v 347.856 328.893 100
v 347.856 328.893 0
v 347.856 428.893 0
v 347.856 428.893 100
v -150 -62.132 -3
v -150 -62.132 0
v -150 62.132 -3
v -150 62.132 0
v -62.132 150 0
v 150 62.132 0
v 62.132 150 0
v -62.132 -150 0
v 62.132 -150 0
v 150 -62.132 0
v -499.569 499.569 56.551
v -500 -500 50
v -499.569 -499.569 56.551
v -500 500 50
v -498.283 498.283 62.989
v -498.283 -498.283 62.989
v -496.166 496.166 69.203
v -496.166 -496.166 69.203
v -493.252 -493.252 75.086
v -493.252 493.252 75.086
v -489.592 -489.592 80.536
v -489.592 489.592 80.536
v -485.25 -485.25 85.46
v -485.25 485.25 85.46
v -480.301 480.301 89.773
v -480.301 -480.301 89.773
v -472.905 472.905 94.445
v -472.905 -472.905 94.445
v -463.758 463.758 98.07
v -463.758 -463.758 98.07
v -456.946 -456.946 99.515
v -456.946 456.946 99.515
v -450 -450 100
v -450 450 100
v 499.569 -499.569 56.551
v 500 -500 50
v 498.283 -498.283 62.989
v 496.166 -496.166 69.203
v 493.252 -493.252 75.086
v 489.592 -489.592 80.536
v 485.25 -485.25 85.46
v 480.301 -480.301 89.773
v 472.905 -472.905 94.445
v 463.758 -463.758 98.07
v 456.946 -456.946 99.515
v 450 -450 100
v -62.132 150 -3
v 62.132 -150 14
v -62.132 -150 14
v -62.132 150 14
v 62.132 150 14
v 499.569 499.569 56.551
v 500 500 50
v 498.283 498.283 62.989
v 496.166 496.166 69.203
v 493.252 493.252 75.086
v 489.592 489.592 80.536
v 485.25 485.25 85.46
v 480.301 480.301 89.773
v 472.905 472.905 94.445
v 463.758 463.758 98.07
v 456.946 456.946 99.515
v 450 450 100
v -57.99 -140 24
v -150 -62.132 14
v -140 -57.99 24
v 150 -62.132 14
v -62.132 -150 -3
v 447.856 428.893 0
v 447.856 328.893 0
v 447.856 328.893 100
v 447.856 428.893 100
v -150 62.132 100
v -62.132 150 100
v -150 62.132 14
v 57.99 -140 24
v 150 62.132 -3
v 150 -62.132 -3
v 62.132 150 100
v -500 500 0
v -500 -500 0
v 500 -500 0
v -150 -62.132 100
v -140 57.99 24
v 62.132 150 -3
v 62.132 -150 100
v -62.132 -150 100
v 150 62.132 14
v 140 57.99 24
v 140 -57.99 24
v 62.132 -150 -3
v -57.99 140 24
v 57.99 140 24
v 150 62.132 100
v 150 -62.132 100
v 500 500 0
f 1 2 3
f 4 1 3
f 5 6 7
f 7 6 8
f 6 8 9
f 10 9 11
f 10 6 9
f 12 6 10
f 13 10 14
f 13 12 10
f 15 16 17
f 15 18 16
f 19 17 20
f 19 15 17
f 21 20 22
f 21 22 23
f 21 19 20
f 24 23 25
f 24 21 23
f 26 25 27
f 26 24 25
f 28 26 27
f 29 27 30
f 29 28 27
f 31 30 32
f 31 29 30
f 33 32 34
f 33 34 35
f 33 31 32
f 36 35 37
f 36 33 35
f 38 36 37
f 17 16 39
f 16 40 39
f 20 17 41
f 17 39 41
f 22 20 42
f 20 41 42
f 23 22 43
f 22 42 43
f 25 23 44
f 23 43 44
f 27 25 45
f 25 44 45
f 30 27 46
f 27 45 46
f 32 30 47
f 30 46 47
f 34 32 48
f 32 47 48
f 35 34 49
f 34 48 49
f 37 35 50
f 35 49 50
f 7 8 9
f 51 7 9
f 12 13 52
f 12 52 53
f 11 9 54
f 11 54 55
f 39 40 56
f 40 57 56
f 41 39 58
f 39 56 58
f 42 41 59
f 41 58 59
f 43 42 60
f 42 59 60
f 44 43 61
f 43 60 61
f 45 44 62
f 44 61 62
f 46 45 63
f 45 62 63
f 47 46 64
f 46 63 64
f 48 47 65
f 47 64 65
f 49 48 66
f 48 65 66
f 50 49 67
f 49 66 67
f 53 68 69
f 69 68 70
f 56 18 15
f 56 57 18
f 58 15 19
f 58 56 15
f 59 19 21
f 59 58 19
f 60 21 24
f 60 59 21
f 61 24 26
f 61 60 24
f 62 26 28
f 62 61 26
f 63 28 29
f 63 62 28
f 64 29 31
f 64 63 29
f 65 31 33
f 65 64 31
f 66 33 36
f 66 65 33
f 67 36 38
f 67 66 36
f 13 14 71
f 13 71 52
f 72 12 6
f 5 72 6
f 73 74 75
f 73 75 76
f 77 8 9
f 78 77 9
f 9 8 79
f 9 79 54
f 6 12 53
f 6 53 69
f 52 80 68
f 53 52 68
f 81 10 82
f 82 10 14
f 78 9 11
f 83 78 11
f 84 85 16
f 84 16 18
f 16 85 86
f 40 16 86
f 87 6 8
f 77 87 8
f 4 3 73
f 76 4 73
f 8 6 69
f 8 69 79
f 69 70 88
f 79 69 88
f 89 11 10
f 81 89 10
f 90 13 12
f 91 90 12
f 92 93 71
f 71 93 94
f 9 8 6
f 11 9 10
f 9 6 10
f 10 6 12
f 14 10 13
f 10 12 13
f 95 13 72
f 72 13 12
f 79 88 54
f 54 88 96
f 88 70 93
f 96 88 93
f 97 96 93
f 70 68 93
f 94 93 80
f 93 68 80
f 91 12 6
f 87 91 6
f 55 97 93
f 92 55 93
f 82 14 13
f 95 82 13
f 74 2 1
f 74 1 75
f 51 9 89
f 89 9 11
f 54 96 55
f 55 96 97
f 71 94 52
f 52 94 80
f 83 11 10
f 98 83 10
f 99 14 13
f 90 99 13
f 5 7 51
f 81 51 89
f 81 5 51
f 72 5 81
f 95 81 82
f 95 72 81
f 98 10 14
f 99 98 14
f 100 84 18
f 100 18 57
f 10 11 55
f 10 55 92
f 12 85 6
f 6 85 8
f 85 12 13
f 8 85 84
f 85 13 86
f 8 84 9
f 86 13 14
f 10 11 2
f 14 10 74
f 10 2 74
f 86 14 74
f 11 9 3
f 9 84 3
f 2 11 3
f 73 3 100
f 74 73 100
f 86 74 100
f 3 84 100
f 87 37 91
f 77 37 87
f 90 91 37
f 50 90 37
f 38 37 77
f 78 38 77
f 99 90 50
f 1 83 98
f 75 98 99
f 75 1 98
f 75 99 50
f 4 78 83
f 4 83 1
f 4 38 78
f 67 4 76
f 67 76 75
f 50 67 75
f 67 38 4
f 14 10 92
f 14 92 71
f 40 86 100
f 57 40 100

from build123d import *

# Parameters (mm, degrees)
F0_W     = 1000
F0_H     = 1000
F0_W_2   = 100
F0_H_2   = 100
F1_DEPTH = 100
F2_R     = 50
F4_DEPTH = 3
F5_DEPTH = 24
F6_SIZE  = 10


with BuildPart() as f1:
    # F0 (on Top) → F1 (new body)
    with BuildSketch(Plane.XY):
        Rectangle(F0_W, F0_H)
        Polygon((150, -62.132034356), (62.132034356, -150), (-62.132034356, -150), (-150, -62.132034356), (-150, 62.132034356), (-62.132034356, 150), (62.132034356, 150), (150, 62.132034356), align=None, mode=Mode.SUBTRACT)
        with Locations((397.8564023972, 378.8934528828)):
            Rectangle(F0_W_2, F0_H_2, mode=Mode.SUBTRACT)
    extrude(amount=F1_DEPTH)

    # F2
    f2_edges = [f1.edges().sort_by_distance(p)[0] for p in [
        (0, -500, 100),
        (500, 0, 100),
        (0, 500, 100),
        (-500, 0, 100),
    ]]
    fillet(f2_edges, radius=F2_R)


with BuildPart() as f4:
    # F3 (on face) → F4 (new body)
    with BuildSketch(Plane(origin=(0, 0, 0), x_dir=(1, 0, 0), z_dir=(0, 0, -1))):
        Polygon((-150, -62.132034356), (-62.132034356, -150), (62.132034356, -150), (150, -62.132034356), (150, 62.132034356), (62.132034356, 150), (-62.132034356, 150), (-150, 62.132034356), align=None)
    extrude(amount=F4_DEPTH)


with BuildPart() as f5:
    # F5 (new): a face of the model
    f5_faces = [f4.part.faces().sort_by_distance(p)[0] for p in [
        (0, 0, 0),
    ]]
    extrude(f5_faces, amount=F5_DEPTH)

    # F6
    f6_edges = [f5.edges().sort_by_distance(p)[0] for p in [
        (-150, 0, 24),
        (-106.066017, 106.066017, 24),
        (0, 150, 24),
        (106.066017, 106.066017, 24),
        (150, 0, 24),
        (106.066017, -106.066017, 24),
        (0, -150, 24),
        (-106.066017, -106.066017, 24),
    ]]
    chamfer(f6_edges, length=F6_SIZE)


solid = Compound([f1.part, f4.part, f5.part])
